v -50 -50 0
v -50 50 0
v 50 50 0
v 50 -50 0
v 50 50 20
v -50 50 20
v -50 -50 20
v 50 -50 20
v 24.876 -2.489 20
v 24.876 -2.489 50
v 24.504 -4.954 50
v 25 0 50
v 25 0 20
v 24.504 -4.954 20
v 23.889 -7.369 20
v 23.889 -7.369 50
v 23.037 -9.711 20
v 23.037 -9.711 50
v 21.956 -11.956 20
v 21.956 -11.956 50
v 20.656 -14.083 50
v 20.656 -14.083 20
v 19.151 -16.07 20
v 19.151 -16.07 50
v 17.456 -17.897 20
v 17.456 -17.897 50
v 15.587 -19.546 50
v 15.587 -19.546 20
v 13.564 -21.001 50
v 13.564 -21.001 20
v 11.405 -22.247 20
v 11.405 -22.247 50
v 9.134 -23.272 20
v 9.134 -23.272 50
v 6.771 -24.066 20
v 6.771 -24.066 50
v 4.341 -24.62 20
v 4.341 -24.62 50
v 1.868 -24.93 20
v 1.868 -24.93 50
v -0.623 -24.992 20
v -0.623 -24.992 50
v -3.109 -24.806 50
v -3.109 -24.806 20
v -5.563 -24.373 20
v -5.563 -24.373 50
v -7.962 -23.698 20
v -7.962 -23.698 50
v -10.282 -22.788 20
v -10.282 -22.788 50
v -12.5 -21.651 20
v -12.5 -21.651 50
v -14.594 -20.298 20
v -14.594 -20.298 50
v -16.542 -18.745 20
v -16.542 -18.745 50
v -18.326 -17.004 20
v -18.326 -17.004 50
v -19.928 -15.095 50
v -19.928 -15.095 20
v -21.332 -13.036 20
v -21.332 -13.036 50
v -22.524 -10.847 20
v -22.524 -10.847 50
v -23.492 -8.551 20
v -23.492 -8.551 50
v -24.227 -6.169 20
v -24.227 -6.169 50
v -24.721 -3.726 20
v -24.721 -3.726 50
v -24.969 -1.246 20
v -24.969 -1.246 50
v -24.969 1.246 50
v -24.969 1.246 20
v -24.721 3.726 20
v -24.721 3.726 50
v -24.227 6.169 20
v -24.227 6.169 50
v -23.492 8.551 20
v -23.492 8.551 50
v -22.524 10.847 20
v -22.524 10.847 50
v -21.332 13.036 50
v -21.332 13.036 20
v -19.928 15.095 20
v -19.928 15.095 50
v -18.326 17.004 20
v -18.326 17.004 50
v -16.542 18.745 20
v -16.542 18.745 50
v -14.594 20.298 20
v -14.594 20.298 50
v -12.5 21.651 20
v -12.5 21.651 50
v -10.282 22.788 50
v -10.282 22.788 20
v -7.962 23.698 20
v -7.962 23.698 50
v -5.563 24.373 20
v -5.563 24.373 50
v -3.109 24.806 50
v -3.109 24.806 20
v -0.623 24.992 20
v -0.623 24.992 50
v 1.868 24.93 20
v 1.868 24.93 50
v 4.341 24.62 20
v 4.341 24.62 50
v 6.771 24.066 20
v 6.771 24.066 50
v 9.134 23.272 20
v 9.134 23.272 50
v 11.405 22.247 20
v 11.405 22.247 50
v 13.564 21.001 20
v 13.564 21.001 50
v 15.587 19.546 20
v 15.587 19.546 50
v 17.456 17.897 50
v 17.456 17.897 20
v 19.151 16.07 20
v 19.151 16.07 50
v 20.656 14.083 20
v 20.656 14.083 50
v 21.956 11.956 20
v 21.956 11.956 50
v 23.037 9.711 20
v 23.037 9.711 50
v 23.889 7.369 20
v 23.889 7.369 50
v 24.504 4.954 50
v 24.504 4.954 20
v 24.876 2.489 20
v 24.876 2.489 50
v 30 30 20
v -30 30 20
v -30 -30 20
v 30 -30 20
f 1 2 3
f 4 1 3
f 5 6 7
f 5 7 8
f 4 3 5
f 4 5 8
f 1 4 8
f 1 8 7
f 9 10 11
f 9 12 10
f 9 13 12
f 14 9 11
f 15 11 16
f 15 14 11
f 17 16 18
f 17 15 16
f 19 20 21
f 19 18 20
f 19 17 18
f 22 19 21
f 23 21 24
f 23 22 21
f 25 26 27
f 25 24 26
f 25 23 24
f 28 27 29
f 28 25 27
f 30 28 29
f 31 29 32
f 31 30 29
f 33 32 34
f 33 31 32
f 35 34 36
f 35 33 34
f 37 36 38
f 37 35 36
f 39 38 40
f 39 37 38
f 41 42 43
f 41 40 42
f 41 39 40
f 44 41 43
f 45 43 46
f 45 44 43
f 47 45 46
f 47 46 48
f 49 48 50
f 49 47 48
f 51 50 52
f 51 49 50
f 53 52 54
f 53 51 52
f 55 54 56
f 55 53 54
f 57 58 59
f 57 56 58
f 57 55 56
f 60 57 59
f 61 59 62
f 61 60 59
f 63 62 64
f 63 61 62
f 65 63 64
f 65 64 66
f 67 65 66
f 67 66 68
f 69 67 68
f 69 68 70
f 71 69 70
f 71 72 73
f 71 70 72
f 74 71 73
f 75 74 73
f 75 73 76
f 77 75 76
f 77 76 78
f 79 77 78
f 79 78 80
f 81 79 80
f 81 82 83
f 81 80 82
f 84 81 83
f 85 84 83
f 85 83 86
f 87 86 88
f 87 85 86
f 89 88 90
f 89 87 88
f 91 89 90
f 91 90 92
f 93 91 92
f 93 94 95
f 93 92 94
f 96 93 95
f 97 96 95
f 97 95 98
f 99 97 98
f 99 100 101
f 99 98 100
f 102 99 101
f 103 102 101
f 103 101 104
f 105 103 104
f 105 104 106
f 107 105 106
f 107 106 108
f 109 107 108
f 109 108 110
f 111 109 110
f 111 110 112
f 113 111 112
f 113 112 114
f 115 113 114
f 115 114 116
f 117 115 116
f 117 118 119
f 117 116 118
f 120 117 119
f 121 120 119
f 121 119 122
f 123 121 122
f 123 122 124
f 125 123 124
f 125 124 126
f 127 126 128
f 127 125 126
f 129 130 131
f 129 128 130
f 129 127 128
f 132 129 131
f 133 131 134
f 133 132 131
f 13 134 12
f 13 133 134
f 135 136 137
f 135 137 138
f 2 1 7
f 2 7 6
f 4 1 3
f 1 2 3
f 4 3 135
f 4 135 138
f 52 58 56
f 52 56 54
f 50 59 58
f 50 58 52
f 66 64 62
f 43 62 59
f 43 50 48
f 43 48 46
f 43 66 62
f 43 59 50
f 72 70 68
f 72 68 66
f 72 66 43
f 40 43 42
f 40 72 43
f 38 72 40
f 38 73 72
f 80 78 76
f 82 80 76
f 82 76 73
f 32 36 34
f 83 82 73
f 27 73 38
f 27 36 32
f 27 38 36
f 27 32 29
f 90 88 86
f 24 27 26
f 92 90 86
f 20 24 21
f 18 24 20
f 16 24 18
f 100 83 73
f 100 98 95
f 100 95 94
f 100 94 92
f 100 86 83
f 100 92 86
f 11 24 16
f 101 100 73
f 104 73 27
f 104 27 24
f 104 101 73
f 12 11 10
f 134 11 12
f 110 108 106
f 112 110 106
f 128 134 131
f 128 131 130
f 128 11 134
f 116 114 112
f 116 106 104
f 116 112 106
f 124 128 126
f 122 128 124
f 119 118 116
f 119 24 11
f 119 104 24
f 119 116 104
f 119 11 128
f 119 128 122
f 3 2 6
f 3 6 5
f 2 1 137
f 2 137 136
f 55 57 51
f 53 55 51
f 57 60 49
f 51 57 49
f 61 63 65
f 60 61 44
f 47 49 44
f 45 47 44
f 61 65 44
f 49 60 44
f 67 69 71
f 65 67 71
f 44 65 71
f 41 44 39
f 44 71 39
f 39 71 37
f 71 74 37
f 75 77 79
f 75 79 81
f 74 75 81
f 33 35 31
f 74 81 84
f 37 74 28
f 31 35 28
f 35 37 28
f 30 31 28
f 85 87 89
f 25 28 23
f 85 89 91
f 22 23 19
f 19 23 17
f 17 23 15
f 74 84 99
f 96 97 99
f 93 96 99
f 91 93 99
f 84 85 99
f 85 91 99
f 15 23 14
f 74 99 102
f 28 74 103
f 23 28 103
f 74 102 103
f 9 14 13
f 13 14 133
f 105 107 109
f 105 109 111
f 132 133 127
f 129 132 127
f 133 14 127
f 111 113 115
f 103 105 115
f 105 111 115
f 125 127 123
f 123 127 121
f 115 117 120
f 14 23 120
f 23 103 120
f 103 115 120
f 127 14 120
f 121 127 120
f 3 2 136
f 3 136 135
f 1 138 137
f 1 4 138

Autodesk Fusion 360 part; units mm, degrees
sketch "Sketch1" plane through (0, 0, 0) normal (0, 0, 1) x (1, 0, 0)
  line L0 (-50, 50) -> (50, 50)
  line L1 (50, 50) -> (50, -50)
  line L2 (50, -50) -> (-50, -50)
  line L3 (-50, -50) -> (-50, 50)
  point P0 (-122.6558, 0.4138)
  point P1 (-120, 25)
  dimension "d14" = 100
  dimension "d15" = 100
  dimension "d17" = 50
  dimension "d18" = 50
extrude "Extrude1" add sketch "Sketch1" along normal blind 20 makes body 1
sketch "Sketch1 (2)" plane through (0, 0, 0) normal (0, 0, 1) x (1, 0, 0) in component "ChildComponent"
  circle A0 centre (0, 0) radius 25
  dimension "d7" = 50
extrude "Extrude1'" add sketch "Sketch1 (2)" along normal blind 30 from surface at 20 separate body makes body 2 in component "ChildComponent"
extrude "Extrude2" add sketch "Sketch1" along normal blind 20 draft -45 separate body makes body 3
copy_body "CutPasteBodies1" bodies 3 removing the originals makes body 4 in component "ComponentWithBody"
component "ChildComponent" placed x (1, 0, 0) y (0, 1, 0) z (0, 0, 1) at (0, 0, 0)
component "ComponentWithBody" placed x (1, 0, 0) y (0, 1, 0) z (0, 0, 1) at (0, 0, 0)
equation "modelHeight = 20 mm"
equation "childModelWidth = 50 mm"
equation "d5 = modelHeight"
equation "d7 = childModelWidth"
equation "modelSize = 100 mm"
equation "d14 = modelSize"
equation "d15 = modelSize"
equation "d17 = modelSize / 2"
equation "d18 = modelSize / 2"
equation "d19 = modelHeight"
